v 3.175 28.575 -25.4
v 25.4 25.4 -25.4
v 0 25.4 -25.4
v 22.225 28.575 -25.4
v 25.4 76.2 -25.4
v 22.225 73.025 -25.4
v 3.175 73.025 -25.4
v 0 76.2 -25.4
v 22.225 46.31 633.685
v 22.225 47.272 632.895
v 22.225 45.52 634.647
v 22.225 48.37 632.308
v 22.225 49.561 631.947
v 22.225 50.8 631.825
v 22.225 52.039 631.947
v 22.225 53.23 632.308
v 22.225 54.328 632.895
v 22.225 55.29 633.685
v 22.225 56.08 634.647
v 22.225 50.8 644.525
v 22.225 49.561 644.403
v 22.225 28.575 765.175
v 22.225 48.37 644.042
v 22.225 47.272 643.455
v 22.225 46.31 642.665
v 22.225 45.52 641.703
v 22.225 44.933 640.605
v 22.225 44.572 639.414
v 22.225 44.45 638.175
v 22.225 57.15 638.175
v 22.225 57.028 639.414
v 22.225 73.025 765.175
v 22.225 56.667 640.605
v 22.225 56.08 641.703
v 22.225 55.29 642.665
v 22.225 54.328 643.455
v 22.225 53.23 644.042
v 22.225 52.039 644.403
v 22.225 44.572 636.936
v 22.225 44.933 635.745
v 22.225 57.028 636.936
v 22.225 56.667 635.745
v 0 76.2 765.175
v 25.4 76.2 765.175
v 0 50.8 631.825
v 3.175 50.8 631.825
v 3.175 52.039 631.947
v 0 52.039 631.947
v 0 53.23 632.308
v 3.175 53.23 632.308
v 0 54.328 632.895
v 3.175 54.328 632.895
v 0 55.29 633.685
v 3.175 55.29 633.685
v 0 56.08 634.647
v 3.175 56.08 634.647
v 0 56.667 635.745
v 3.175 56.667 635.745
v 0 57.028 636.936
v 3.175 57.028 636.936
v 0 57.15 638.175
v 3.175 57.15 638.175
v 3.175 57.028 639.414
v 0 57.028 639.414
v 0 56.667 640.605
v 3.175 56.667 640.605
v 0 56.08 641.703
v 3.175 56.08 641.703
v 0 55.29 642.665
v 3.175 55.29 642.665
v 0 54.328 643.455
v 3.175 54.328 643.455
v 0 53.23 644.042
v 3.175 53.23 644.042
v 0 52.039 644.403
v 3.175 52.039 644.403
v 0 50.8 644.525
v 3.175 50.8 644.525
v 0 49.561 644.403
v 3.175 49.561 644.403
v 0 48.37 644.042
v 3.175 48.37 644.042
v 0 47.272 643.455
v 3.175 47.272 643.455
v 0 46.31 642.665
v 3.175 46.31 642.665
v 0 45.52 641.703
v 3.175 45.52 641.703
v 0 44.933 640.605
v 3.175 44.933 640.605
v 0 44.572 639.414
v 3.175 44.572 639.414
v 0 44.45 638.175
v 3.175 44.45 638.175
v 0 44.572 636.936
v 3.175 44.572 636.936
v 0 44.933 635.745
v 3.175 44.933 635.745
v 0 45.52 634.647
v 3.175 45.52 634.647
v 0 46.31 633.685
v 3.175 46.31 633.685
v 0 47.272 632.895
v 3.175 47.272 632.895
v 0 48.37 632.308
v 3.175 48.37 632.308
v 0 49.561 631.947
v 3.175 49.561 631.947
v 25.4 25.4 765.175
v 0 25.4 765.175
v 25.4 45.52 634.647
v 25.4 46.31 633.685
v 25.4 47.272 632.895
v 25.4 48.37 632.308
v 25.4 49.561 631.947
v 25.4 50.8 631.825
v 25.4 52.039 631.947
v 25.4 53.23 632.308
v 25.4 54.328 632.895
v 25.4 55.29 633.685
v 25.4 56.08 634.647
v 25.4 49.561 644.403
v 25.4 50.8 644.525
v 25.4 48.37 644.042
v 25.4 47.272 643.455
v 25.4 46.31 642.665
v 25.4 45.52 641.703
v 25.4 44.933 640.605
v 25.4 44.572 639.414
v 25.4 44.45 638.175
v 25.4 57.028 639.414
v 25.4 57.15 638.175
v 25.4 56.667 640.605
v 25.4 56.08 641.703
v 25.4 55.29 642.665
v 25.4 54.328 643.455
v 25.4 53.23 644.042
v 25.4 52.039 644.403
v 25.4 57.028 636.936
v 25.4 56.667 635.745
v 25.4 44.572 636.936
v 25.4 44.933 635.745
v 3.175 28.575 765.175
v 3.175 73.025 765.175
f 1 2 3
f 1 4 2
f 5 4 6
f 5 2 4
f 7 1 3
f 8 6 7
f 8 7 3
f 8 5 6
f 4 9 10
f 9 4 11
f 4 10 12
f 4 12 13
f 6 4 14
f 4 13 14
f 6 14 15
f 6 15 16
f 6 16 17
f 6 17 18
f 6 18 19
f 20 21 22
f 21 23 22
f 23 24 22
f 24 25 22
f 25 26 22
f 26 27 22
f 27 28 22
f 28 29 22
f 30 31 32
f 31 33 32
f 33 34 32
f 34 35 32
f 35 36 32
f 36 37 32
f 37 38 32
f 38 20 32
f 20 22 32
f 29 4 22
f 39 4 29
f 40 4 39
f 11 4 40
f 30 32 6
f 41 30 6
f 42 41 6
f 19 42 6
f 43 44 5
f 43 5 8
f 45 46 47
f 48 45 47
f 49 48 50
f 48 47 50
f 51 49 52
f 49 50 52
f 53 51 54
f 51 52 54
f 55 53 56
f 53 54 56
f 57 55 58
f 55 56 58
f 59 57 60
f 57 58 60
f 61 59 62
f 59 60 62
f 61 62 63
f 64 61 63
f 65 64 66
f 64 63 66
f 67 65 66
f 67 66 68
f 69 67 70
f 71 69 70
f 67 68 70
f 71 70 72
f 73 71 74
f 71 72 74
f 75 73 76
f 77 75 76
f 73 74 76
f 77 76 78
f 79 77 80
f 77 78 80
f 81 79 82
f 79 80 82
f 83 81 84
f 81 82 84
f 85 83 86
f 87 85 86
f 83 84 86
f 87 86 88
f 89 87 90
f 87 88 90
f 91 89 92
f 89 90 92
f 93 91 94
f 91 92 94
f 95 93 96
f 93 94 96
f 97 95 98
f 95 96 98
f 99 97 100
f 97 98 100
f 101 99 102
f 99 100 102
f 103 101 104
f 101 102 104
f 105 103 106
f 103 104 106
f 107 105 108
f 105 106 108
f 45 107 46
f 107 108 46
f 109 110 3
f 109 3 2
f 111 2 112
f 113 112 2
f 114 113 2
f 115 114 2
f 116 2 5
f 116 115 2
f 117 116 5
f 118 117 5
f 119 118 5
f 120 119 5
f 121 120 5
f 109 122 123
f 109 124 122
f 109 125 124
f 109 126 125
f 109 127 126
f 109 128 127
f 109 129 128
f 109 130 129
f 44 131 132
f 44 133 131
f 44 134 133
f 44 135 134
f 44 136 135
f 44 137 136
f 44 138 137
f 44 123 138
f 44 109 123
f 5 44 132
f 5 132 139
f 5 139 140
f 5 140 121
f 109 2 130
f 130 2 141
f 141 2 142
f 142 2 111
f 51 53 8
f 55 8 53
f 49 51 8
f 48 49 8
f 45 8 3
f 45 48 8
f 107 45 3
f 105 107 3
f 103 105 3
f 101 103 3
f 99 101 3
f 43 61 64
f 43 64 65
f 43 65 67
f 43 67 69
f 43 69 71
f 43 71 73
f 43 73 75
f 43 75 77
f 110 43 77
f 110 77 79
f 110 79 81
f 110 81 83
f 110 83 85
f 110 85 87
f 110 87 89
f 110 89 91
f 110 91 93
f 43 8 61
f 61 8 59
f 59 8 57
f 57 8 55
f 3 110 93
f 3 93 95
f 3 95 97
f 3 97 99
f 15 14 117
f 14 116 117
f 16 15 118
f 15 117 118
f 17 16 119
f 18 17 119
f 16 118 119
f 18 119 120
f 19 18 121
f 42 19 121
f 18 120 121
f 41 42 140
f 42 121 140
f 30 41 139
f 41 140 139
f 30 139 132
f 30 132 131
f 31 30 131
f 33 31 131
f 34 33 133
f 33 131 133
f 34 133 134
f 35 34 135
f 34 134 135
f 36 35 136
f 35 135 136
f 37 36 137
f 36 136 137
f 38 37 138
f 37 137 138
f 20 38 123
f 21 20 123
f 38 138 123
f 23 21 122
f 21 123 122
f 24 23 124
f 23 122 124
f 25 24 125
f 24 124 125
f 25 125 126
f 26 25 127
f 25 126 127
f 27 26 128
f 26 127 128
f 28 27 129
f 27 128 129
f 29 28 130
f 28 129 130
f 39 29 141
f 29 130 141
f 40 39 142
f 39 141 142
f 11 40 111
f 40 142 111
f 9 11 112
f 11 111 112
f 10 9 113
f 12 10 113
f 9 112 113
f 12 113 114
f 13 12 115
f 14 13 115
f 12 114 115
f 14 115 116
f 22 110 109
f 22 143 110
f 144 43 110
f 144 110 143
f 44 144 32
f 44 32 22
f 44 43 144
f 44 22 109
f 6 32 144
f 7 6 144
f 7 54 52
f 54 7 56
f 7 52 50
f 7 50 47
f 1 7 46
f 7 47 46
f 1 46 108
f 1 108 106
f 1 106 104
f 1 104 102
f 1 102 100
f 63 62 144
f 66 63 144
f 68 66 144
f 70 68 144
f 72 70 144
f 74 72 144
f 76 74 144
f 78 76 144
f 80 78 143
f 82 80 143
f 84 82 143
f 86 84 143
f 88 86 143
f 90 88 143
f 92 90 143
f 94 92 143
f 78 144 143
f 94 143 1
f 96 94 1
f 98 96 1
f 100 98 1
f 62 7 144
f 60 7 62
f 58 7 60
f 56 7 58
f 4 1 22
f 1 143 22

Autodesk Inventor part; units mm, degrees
ref_plane "YZ Plane" through (0, 0, 0) normal (1, 0, 0) x (0, 1, 0)
ref_plane "XZ Plane" through (0, 0, 0) normal (0, 1, 0) x (-1, 0, 0)
ref_plane "XY Plane" through (0, 0, 0) normal (0, 0, 1) x (1, 0, 0)
sketch "Sketch1" plane through (0, 0, 0) normal (0, 0, 1) x (1, 0, 0)
  line L0 (0, 25.4) -> (25.4, 25.4)
  line L1 (25.4, 25.4) -> (25.4, 76.2)
  line L2 (25.4, 76.2) -> (0, 76.2)
  line L3 (0, 76.2) -> (0, 25.4)
  line L4 (0, 25.4) -> (3.175, 25.4)
  line L5 (3.175, 25.4) -> (3.175, 28.575) construction
  line L6 (25.4, 76.2) -> (22.225, 76.2)
  line L7 (22.225, 76.2) -> (22.225, 73.025) construction
  line L8 (3.175, 28.575) -> (22.225, 28.575)
  line L9 (22.225, 28.575) -> (22.225, 73.025)
  line L10 (22.225, 73.025) -> (3.175, 73.025)
  line L11 (3.175, 73.025) -> (3.175, 28.575)
  point P0 (0, 0)
  dimension "d0" = 25.4
  dimension "d1" = 50.8
  dimension "d2" = 3.175
  dimension "d3" = 3.175
  dimension "d4" = 3.175
  dimension "d5" = 3.175
extrude "Extrusion1" add sketch "Sketch1" along normal blind 765.175
sketch "Sketch3" plane through (25.4, 25.4, 0) normal (1, 0, 0) x (0, 0, -1)
  line L0 (0, 0) -> (0, 50.8) projected
  line L1 (0, 50.8) -> (-765.175, 50.8) projected
  line L2 (-765.175, 0) -> (-765.175, 50.8) projected
  line L3 (0, 0) -> (-765.175, 0) projected
  line L4 (-765.175, 50.8) -> (-765.175, 0) projected
  line L5 (-765.175, 25.4) -> (-638.175, 25.4) construction
  circle A0 centre (-638.175, 25.4) radius 6.35
  point P0 (0, -25.4)
  dimension "d13" = 127
  dimension "d14" = 12.7
extrude "Extrusion3" cut sketch "Sketch3" against normal through all contours A0
sketch "Sketch4" plane through (0, 0, 0) normal (0, 0, -1) x (-1, 0, 0)
  line L0 (-3.175, 73.025) -> (-3.175, 28.575) projected
  line L1 (-3.175, 28.575) -> (-22.225, 28.575) projected
  line L2 (-22.225, 28.575) -> (-22.225, 73.025) projected
  line L3 (-22.225, 73.025) -> (-3.175, 73.025) projected
  line L4 (0, 25.4) -> (-25.4, 25.4) projected
  line L5 (0, 76.2) -> (0, 25.4) projected
  line L6 (-25.4, 76.2) -> (0, 76.2) projected
  line L7 (-25.4, 25.4) -> (-25.4, 76.2) projected
  point P0 (0, 0)
extrude "Extrusion4" add sketch "Sketch4" along normal blind 25.4
properties part number "ArmBar"
